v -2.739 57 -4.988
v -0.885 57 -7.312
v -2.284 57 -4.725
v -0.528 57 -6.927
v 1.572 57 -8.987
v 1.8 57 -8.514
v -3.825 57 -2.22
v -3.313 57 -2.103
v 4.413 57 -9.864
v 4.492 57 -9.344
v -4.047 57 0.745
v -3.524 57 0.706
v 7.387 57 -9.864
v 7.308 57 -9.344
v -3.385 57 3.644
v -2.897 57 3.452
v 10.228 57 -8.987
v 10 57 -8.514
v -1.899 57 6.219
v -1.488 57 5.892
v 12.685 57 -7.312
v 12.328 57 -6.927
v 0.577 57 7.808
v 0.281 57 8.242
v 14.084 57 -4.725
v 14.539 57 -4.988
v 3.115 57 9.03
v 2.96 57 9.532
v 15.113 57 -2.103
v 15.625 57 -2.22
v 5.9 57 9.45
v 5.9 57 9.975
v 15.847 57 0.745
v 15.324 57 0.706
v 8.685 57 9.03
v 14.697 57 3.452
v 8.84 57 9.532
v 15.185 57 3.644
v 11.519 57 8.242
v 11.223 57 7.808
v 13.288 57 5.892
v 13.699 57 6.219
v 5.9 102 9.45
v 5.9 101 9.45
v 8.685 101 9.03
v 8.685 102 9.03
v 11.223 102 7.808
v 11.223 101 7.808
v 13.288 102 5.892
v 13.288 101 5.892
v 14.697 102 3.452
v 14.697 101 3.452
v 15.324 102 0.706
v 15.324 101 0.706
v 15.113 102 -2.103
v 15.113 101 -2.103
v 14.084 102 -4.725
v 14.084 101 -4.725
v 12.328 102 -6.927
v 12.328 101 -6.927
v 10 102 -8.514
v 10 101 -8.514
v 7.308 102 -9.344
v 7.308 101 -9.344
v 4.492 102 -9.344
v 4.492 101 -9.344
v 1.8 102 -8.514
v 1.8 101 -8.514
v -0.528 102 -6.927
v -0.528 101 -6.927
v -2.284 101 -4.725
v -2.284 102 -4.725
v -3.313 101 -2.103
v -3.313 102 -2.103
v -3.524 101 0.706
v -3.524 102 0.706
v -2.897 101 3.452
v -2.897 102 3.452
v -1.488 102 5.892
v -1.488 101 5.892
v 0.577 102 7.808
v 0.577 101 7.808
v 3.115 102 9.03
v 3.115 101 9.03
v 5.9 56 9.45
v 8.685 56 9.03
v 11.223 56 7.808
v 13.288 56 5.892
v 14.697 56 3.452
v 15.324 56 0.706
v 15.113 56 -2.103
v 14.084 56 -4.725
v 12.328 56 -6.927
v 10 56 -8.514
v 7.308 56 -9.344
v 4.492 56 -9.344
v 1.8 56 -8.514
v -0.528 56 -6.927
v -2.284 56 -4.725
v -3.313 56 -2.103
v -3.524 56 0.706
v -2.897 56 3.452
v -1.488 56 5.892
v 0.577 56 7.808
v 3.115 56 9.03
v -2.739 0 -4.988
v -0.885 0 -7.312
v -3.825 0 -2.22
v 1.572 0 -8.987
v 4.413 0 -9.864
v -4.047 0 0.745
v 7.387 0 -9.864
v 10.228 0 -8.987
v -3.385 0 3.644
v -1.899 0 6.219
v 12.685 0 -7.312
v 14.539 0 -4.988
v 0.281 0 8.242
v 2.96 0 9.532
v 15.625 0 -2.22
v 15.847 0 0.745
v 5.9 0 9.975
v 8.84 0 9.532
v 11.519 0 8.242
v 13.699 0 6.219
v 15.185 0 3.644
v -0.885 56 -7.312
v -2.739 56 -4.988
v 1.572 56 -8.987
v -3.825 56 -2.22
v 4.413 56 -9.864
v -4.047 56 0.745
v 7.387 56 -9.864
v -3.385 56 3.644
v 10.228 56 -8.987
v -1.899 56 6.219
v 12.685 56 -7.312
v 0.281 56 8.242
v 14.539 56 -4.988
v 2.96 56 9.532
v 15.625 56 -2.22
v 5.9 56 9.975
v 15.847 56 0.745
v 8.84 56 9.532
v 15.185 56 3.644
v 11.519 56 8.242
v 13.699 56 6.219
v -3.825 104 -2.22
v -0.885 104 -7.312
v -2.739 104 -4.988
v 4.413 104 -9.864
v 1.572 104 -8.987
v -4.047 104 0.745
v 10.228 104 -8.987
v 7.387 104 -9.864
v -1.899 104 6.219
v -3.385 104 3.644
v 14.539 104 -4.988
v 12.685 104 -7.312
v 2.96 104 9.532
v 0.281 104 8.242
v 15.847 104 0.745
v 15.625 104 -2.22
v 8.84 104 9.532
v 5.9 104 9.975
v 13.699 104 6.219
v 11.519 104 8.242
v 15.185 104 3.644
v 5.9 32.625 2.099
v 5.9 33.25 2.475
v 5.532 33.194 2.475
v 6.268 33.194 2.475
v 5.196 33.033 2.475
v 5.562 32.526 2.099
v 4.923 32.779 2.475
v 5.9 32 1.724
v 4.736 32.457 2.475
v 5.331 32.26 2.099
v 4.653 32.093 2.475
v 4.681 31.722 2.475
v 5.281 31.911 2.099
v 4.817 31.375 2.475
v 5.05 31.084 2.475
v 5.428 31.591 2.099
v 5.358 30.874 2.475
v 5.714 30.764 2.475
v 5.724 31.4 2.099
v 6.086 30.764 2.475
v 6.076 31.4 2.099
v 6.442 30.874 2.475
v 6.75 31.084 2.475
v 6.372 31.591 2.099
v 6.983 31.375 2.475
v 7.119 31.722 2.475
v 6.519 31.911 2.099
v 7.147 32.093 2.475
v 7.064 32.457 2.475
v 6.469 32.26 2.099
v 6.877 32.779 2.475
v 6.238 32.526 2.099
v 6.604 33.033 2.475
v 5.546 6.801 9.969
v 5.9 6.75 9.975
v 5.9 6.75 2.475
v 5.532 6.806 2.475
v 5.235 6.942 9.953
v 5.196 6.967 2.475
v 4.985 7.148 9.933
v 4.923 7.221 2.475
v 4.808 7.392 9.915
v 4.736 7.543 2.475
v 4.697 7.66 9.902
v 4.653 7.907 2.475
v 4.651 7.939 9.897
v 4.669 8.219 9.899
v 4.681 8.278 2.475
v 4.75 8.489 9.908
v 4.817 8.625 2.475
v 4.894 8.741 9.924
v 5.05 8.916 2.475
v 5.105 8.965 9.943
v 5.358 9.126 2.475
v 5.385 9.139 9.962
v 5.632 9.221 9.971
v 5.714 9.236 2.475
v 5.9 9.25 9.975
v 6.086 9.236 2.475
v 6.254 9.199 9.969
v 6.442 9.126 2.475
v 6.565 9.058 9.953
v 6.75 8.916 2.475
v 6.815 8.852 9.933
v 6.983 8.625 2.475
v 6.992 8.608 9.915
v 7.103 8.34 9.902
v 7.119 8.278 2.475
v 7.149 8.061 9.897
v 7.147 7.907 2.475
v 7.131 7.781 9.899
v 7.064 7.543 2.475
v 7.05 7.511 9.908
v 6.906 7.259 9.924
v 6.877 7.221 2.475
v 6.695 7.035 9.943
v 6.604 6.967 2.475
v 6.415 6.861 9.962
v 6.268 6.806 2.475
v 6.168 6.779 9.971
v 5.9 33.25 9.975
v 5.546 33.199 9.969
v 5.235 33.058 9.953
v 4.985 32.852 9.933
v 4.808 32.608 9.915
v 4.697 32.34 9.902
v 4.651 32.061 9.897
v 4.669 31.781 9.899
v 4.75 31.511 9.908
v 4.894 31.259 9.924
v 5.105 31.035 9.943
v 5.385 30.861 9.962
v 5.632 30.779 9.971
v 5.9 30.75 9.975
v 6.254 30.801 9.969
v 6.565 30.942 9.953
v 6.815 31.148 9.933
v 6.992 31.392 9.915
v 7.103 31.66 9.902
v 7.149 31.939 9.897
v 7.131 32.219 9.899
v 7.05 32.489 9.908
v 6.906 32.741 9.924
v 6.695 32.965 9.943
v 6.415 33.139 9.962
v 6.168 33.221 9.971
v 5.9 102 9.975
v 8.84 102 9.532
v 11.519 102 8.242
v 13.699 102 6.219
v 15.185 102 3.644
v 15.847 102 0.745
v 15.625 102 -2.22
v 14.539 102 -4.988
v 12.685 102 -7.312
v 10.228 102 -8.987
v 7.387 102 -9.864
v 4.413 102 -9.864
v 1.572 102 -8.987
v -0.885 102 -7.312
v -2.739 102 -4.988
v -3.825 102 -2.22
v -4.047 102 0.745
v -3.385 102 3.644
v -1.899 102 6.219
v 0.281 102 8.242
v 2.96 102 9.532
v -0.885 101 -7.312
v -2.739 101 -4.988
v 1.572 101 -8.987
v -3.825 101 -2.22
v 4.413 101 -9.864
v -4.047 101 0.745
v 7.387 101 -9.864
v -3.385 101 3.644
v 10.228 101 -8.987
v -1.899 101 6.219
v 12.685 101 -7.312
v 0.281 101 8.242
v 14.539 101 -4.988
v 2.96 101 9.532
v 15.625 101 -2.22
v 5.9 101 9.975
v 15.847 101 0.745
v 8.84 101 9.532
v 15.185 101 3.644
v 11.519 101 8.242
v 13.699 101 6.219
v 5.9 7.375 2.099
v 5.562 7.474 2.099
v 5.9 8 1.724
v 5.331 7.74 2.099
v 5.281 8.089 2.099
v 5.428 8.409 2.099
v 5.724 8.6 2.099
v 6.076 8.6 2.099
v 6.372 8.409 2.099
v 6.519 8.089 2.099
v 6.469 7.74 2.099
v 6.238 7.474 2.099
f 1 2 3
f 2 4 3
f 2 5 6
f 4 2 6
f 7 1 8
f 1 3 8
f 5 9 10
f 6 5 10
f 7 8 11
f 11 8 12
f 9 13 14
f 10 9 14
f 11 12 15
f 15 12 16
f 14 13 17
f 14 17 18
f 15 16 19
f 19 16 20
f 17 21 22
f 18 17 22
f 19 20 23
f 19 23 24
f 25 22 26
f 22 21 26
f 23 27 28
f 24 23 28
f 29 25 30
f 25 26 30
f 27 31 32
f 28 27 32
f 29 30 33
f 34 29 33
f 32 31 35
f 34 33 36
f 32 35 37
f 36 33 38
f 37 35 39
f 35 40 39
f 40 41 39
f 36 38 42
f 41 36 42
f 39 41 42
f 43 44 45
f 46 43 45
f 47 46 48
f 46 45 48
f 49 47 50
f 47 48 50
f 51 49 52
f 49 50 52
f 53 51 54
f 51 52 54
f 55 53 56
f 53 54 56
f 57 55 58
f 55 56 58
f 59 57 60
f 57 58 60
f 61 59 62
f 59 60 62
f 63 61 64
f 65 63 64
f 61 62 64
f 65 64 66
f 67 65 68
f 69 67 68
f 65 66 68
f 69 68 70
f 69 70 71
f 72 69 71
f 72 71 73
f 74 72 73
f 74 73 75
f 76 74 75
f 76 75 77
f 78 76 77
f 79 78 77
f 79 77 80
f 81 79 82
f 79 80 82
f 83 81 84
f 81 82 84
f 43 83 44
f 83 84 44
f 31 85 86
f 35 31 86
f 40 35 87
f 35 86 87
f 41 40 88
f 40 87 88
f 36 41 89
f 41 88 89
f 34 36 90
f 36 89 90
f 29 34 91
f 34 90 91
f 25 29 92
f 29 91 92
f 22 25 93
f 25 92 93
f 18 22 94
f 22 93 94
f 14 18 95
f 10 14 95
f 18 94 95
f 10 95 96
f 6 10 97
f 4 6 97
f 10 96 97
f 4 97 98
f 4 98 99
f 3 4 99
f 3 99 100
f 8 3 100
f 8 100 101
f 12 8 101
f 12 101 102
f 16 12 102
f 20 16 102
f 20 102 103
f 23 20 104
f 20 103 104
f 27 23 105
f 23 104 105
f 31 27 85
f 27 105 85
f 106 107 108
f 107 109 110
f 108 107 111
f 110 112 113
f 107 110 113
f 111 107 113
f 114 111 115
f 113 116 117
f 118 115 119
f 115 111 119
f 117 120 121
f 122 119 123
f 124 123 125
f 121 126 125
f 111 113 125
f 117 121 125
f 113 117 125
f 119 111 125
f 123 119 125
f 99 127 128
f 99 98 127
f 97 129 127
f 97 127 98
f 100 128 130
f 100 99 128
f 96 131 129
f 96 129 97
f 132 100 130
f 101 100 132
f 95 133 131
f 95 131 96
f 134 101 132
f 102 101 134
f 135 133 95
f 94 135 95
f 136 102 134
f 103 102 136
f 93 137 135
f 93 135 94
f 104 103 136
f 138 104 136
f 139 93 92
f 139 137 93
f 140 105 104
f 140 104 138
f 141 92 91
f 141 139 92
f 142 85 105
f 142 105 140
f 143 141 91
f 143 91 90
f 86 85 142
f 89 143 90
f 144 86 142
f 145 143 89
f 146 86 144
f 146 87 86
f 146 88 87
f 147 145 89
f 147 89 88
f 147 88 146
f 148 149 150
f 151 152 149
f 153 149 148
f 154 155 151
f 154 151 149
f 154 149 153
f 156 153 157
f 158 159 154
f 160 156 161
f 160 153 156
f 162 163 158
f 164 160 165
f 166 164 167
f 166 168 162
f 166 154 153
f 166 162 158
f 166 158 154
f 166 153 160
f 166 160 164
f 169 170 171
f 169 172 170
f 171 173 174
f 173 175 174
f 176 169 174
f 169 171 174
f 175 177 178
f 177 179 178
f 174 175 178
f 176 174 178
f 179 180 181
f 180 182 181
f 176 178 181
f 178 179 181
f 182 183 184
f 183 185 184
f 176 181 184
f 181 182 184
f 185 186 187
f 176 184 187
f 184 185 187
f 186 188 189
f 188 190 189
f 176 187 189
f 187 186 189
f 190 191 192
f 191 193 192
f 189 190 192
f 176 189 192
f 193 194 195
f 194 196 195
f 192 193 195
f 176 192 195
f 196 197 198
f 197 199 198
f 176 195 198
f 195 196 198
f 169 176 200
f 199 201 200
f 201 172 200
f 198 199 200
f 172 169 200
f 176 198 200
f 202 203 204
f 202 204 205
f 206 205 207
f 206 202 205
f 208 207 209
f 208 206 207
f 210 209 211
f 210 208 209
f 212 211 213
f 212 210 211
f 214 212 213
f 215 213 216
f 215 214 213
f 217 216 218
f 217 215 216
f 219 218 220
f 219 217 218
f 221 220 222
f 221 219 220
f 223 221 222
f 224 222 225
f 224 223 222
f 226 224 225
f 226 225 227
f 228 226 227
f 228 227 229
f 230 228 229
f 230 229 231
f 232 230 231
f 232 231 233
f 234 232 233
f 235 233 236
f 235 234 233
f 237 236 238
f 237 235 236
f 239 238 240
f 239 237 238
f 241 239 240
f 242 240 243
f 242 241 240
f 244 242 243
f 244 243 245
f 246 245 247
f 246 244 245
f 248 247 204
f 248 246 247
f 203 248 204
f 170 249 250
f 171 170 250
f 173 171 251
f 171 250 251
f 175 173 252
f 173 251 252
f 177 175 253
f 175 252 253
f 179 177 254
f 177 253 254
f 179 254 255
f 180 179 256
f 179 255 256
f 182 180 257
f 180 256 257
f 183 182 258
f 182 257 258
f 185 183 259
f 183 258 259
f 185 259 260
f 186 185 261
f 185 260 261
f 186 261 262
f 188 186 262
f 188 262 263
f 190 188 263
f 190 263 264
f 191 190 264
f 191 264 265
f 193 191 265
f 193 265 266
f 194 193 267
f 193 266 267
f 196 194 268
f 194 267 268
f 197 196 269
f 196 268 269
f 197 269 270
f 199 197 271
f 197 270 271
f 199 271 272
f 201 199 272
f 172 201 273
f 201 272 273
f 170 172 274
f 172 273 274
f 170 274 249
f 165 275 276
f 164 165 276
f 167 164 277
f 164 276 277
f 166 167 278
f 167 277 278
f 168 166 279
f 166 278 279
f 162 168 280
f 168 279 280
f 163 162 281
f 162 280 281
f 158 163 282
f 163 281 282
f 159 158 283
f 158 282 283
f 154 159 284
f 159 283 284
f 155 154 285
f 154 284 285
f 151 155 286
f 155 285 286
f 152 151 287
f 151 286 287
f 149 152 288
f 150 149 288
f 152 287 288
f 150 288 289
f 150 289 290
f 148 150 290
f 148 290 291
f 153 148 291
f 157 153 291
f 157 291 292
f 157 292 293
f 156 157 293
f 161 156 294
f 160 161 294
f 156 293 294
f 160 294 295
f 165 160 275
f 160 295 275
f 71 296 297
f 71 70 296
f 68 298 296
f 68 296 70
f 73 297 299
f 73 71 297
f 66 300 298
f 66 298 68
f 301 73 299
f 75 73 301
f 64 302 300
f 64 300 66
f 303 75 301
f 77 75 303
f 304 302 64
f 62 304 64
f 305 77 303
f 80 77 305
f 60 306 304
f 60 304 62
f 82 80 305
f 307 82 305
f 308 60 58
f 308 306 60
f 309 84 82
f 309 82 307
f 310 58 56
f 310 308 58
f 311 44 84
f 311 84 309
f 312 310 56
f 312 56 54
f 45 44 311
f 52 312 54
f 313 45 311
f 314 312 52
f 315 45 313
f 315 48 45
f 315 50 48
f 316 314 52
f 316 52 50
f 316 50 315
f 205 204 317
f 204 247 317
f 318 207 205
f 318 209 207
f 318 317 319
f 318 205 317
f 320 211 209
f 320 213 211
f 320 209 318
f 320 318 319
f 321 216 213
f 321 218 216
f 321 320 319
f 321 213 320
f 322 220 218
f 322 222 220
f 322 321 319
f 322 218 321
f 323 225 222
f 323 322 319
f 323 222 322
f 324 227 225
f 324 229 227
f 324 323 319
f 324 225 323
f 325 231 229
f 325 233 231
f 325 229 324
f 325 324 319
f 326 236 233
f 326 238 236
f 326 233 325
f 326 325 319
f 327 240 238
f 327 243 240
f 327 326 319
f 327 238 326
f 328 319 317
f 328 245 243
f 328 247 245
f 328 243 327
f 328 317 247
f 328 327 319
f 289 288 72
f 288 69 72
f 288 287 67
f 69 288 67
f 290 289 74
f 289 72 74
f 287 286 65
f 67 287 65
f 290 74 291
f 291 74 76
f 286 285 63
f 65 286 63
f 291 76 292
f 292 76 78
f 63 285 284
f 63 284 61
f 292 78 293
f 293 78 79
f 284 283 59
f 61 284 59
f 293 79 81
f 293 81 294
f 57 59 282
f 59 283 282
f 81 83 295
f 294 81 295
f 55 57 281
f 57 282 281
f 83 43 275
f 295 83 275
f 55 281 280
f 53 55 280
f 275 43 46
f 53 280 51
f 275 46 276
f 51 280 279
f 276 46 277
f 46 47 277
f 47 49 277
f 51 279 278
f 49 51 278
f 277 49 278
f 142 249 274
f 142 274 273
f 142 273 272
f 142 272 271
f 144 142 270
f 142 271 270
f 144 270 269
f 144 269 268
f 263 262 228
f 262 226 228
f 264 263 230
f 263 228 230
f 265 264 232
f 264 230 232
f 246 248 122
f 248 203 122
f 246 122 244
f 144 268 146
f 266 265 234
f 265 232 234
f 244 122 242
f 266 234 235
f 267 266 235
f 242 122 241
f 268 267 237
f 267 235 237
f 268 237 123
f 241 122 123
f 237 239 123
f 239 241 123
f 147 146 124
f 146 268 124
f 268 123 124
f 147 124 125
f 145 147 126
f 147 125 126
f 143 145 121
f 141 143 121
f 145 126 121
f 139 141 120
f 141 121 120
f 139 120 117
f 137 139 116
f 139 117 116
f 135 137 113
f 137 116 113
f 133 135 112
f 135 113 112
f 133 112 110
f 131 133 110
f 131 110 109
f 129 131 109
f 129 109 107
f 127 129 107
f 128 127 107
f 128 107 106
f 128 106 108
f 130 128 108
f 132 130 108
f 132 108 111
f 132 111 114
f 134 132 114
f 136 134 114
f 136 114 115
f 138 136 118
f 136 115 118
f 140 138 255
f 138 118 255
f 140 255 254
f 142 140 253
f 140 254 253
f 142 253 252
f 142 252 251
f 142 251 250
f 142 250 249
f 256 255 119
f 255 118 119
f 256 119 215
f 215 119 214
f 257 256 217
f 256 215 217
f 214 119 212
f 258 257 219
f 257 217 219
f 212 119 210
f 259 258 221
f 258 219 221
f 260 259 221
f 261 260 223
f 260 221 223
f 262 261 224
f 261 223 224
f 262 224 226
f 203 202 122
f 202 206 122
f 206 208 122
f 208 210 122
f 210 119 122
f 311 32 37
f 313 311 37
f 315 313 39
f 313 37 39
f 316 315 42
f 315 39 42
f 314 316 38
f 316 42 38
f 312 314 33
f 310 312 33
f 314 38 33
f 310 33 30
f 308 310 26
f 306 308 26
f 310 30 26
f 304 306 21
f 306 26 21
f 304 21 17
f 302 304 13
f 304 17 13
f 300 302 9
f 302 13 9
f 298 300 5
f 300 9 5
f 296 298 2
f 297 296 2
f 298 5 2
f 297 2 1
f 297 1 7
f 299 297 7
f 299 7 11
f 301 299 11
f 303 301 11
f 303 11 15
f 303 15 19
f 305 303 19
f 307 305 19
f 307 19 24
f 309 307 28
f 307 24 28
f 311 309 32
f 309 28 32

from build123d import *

# Parameters (mm, degrees)
SKETCH_1_R        = 9.975
EXTRUDE_1_DEPTH   = 40
SKETCH_5_R        = 9.975
F_16MM_DEPTH      = 16
SKETCH_6_R        = 9.45
EXTRUDE_1_2_DEPTH = 1
SKETCH_7_R        = 9.975
EXTRUDE_4_DEPTH   = 44
SKETCH_8_R        = 9.45
EXTRUDE_2_DEPTH   = 1
SKETCH_9_R        = 9.975
EXTRUDE_6_DEPTH   = 2


with BuildPart() as part:
    # 草图1 → Extrude 1 (new body)
    with BuildSketch(Plane(origin=(0, 0, 0), x_dir=(1, 0, 0), z_dir=(0, 1, 0))):
        with Locations(Location((5.9, 0, 0), (0, 0, 270))):
            Circle(SKETCH_1_R)
    extrude(amount=EXTRUDE_1_DEPTH)

    # 草图5 → 16mm 铰链间距 (add)
    with BuildSketch(Plane(origin=(0, 40, 0), x_dir=(1, 0, 0), z_dir=(0, 1, 0))):
        with Locations(Location((5.9, 0, 0), (0, 0, 270))):
            Circle(SKETCH_5_R)
    extrude(amount=F_16MM_DEPTH)

    # 草图6 → Extrude 1 2 (add)
    with BuildSketch(Plane(origin=(0, 56, 0), x_dir=(1, 0, 0), z_dir=(0, 1, 0))):
        with Locations(Location((5.9, 0, 0), (0, 0, 270))):
            Circle(SKETCH_6_R)
    extrude(amount=EXTRUDE_1_2_DEPTH)

    # 草图7 → 凸台-拉伸4 (add)
    with BuildSketch(Plane(origin=(0, 57, 0), x_dir=(1, 0, 0), z_dir=(0, 1, 0))):
        with Locations(Location((5.9, 0, 0), (0, 0, 270))):
            Circle(SKETCH_7_R)
    extrude(amount=EXTRUDE_4_DEPTH)

    # 草图8 → 卡簧2 (add)
    with BuildSketch(Plane(origin=(0, 101, 0), x_dir=(1, 0, 0), z_dir=(0, 1, 0))):
        with Locations(Location((5.9, 0, 0), (0, 0, 270))):
            Circle(SKETCH_8_R)
    extrude(amount=EXTRUDE_2_DEPTH)

    # 草图9 → 凸台-拉伸6 (add)
    with BuildSketch(Plane(origin=(0, 102, 0), x_dir=(1, 0, 0), z_dir=(0, 1, 0))):
        with Locations(Location((5.9, 0, 0), (0, 0, 270))):
            Circle(SKETCH_9_R)
    extrude(amount=EXTRUDE_6_DEPTH)

    # 草图22 → M3 螺纹孔7 (revolve, cut)
    with BuildSketch(Plane(origin=(5.9, 8, 9.975), x_dir=(0, -1, 0), z_dir=(1, 0, 0))):
        Polygon((0, 0), (0, 8.251075774), (1.25, 7.5), (1.25, 0), align=None)
    hole_wizard_m3_7 = revolve(axis=Axis((5.9, 8, 16.325), (0, 0, -1)), mode=Mode.SUBTRACT)

    # 镜向1: M3 螺纹孔7 across plane
    add(hole_wizard_m3_7.mirror(Plane(origin=(0, 20, 0), x_dir=(0, 0, 1), z_dir=(0, -1, 0))), mode=Mode.SUBTRACT)


solid = part.part
